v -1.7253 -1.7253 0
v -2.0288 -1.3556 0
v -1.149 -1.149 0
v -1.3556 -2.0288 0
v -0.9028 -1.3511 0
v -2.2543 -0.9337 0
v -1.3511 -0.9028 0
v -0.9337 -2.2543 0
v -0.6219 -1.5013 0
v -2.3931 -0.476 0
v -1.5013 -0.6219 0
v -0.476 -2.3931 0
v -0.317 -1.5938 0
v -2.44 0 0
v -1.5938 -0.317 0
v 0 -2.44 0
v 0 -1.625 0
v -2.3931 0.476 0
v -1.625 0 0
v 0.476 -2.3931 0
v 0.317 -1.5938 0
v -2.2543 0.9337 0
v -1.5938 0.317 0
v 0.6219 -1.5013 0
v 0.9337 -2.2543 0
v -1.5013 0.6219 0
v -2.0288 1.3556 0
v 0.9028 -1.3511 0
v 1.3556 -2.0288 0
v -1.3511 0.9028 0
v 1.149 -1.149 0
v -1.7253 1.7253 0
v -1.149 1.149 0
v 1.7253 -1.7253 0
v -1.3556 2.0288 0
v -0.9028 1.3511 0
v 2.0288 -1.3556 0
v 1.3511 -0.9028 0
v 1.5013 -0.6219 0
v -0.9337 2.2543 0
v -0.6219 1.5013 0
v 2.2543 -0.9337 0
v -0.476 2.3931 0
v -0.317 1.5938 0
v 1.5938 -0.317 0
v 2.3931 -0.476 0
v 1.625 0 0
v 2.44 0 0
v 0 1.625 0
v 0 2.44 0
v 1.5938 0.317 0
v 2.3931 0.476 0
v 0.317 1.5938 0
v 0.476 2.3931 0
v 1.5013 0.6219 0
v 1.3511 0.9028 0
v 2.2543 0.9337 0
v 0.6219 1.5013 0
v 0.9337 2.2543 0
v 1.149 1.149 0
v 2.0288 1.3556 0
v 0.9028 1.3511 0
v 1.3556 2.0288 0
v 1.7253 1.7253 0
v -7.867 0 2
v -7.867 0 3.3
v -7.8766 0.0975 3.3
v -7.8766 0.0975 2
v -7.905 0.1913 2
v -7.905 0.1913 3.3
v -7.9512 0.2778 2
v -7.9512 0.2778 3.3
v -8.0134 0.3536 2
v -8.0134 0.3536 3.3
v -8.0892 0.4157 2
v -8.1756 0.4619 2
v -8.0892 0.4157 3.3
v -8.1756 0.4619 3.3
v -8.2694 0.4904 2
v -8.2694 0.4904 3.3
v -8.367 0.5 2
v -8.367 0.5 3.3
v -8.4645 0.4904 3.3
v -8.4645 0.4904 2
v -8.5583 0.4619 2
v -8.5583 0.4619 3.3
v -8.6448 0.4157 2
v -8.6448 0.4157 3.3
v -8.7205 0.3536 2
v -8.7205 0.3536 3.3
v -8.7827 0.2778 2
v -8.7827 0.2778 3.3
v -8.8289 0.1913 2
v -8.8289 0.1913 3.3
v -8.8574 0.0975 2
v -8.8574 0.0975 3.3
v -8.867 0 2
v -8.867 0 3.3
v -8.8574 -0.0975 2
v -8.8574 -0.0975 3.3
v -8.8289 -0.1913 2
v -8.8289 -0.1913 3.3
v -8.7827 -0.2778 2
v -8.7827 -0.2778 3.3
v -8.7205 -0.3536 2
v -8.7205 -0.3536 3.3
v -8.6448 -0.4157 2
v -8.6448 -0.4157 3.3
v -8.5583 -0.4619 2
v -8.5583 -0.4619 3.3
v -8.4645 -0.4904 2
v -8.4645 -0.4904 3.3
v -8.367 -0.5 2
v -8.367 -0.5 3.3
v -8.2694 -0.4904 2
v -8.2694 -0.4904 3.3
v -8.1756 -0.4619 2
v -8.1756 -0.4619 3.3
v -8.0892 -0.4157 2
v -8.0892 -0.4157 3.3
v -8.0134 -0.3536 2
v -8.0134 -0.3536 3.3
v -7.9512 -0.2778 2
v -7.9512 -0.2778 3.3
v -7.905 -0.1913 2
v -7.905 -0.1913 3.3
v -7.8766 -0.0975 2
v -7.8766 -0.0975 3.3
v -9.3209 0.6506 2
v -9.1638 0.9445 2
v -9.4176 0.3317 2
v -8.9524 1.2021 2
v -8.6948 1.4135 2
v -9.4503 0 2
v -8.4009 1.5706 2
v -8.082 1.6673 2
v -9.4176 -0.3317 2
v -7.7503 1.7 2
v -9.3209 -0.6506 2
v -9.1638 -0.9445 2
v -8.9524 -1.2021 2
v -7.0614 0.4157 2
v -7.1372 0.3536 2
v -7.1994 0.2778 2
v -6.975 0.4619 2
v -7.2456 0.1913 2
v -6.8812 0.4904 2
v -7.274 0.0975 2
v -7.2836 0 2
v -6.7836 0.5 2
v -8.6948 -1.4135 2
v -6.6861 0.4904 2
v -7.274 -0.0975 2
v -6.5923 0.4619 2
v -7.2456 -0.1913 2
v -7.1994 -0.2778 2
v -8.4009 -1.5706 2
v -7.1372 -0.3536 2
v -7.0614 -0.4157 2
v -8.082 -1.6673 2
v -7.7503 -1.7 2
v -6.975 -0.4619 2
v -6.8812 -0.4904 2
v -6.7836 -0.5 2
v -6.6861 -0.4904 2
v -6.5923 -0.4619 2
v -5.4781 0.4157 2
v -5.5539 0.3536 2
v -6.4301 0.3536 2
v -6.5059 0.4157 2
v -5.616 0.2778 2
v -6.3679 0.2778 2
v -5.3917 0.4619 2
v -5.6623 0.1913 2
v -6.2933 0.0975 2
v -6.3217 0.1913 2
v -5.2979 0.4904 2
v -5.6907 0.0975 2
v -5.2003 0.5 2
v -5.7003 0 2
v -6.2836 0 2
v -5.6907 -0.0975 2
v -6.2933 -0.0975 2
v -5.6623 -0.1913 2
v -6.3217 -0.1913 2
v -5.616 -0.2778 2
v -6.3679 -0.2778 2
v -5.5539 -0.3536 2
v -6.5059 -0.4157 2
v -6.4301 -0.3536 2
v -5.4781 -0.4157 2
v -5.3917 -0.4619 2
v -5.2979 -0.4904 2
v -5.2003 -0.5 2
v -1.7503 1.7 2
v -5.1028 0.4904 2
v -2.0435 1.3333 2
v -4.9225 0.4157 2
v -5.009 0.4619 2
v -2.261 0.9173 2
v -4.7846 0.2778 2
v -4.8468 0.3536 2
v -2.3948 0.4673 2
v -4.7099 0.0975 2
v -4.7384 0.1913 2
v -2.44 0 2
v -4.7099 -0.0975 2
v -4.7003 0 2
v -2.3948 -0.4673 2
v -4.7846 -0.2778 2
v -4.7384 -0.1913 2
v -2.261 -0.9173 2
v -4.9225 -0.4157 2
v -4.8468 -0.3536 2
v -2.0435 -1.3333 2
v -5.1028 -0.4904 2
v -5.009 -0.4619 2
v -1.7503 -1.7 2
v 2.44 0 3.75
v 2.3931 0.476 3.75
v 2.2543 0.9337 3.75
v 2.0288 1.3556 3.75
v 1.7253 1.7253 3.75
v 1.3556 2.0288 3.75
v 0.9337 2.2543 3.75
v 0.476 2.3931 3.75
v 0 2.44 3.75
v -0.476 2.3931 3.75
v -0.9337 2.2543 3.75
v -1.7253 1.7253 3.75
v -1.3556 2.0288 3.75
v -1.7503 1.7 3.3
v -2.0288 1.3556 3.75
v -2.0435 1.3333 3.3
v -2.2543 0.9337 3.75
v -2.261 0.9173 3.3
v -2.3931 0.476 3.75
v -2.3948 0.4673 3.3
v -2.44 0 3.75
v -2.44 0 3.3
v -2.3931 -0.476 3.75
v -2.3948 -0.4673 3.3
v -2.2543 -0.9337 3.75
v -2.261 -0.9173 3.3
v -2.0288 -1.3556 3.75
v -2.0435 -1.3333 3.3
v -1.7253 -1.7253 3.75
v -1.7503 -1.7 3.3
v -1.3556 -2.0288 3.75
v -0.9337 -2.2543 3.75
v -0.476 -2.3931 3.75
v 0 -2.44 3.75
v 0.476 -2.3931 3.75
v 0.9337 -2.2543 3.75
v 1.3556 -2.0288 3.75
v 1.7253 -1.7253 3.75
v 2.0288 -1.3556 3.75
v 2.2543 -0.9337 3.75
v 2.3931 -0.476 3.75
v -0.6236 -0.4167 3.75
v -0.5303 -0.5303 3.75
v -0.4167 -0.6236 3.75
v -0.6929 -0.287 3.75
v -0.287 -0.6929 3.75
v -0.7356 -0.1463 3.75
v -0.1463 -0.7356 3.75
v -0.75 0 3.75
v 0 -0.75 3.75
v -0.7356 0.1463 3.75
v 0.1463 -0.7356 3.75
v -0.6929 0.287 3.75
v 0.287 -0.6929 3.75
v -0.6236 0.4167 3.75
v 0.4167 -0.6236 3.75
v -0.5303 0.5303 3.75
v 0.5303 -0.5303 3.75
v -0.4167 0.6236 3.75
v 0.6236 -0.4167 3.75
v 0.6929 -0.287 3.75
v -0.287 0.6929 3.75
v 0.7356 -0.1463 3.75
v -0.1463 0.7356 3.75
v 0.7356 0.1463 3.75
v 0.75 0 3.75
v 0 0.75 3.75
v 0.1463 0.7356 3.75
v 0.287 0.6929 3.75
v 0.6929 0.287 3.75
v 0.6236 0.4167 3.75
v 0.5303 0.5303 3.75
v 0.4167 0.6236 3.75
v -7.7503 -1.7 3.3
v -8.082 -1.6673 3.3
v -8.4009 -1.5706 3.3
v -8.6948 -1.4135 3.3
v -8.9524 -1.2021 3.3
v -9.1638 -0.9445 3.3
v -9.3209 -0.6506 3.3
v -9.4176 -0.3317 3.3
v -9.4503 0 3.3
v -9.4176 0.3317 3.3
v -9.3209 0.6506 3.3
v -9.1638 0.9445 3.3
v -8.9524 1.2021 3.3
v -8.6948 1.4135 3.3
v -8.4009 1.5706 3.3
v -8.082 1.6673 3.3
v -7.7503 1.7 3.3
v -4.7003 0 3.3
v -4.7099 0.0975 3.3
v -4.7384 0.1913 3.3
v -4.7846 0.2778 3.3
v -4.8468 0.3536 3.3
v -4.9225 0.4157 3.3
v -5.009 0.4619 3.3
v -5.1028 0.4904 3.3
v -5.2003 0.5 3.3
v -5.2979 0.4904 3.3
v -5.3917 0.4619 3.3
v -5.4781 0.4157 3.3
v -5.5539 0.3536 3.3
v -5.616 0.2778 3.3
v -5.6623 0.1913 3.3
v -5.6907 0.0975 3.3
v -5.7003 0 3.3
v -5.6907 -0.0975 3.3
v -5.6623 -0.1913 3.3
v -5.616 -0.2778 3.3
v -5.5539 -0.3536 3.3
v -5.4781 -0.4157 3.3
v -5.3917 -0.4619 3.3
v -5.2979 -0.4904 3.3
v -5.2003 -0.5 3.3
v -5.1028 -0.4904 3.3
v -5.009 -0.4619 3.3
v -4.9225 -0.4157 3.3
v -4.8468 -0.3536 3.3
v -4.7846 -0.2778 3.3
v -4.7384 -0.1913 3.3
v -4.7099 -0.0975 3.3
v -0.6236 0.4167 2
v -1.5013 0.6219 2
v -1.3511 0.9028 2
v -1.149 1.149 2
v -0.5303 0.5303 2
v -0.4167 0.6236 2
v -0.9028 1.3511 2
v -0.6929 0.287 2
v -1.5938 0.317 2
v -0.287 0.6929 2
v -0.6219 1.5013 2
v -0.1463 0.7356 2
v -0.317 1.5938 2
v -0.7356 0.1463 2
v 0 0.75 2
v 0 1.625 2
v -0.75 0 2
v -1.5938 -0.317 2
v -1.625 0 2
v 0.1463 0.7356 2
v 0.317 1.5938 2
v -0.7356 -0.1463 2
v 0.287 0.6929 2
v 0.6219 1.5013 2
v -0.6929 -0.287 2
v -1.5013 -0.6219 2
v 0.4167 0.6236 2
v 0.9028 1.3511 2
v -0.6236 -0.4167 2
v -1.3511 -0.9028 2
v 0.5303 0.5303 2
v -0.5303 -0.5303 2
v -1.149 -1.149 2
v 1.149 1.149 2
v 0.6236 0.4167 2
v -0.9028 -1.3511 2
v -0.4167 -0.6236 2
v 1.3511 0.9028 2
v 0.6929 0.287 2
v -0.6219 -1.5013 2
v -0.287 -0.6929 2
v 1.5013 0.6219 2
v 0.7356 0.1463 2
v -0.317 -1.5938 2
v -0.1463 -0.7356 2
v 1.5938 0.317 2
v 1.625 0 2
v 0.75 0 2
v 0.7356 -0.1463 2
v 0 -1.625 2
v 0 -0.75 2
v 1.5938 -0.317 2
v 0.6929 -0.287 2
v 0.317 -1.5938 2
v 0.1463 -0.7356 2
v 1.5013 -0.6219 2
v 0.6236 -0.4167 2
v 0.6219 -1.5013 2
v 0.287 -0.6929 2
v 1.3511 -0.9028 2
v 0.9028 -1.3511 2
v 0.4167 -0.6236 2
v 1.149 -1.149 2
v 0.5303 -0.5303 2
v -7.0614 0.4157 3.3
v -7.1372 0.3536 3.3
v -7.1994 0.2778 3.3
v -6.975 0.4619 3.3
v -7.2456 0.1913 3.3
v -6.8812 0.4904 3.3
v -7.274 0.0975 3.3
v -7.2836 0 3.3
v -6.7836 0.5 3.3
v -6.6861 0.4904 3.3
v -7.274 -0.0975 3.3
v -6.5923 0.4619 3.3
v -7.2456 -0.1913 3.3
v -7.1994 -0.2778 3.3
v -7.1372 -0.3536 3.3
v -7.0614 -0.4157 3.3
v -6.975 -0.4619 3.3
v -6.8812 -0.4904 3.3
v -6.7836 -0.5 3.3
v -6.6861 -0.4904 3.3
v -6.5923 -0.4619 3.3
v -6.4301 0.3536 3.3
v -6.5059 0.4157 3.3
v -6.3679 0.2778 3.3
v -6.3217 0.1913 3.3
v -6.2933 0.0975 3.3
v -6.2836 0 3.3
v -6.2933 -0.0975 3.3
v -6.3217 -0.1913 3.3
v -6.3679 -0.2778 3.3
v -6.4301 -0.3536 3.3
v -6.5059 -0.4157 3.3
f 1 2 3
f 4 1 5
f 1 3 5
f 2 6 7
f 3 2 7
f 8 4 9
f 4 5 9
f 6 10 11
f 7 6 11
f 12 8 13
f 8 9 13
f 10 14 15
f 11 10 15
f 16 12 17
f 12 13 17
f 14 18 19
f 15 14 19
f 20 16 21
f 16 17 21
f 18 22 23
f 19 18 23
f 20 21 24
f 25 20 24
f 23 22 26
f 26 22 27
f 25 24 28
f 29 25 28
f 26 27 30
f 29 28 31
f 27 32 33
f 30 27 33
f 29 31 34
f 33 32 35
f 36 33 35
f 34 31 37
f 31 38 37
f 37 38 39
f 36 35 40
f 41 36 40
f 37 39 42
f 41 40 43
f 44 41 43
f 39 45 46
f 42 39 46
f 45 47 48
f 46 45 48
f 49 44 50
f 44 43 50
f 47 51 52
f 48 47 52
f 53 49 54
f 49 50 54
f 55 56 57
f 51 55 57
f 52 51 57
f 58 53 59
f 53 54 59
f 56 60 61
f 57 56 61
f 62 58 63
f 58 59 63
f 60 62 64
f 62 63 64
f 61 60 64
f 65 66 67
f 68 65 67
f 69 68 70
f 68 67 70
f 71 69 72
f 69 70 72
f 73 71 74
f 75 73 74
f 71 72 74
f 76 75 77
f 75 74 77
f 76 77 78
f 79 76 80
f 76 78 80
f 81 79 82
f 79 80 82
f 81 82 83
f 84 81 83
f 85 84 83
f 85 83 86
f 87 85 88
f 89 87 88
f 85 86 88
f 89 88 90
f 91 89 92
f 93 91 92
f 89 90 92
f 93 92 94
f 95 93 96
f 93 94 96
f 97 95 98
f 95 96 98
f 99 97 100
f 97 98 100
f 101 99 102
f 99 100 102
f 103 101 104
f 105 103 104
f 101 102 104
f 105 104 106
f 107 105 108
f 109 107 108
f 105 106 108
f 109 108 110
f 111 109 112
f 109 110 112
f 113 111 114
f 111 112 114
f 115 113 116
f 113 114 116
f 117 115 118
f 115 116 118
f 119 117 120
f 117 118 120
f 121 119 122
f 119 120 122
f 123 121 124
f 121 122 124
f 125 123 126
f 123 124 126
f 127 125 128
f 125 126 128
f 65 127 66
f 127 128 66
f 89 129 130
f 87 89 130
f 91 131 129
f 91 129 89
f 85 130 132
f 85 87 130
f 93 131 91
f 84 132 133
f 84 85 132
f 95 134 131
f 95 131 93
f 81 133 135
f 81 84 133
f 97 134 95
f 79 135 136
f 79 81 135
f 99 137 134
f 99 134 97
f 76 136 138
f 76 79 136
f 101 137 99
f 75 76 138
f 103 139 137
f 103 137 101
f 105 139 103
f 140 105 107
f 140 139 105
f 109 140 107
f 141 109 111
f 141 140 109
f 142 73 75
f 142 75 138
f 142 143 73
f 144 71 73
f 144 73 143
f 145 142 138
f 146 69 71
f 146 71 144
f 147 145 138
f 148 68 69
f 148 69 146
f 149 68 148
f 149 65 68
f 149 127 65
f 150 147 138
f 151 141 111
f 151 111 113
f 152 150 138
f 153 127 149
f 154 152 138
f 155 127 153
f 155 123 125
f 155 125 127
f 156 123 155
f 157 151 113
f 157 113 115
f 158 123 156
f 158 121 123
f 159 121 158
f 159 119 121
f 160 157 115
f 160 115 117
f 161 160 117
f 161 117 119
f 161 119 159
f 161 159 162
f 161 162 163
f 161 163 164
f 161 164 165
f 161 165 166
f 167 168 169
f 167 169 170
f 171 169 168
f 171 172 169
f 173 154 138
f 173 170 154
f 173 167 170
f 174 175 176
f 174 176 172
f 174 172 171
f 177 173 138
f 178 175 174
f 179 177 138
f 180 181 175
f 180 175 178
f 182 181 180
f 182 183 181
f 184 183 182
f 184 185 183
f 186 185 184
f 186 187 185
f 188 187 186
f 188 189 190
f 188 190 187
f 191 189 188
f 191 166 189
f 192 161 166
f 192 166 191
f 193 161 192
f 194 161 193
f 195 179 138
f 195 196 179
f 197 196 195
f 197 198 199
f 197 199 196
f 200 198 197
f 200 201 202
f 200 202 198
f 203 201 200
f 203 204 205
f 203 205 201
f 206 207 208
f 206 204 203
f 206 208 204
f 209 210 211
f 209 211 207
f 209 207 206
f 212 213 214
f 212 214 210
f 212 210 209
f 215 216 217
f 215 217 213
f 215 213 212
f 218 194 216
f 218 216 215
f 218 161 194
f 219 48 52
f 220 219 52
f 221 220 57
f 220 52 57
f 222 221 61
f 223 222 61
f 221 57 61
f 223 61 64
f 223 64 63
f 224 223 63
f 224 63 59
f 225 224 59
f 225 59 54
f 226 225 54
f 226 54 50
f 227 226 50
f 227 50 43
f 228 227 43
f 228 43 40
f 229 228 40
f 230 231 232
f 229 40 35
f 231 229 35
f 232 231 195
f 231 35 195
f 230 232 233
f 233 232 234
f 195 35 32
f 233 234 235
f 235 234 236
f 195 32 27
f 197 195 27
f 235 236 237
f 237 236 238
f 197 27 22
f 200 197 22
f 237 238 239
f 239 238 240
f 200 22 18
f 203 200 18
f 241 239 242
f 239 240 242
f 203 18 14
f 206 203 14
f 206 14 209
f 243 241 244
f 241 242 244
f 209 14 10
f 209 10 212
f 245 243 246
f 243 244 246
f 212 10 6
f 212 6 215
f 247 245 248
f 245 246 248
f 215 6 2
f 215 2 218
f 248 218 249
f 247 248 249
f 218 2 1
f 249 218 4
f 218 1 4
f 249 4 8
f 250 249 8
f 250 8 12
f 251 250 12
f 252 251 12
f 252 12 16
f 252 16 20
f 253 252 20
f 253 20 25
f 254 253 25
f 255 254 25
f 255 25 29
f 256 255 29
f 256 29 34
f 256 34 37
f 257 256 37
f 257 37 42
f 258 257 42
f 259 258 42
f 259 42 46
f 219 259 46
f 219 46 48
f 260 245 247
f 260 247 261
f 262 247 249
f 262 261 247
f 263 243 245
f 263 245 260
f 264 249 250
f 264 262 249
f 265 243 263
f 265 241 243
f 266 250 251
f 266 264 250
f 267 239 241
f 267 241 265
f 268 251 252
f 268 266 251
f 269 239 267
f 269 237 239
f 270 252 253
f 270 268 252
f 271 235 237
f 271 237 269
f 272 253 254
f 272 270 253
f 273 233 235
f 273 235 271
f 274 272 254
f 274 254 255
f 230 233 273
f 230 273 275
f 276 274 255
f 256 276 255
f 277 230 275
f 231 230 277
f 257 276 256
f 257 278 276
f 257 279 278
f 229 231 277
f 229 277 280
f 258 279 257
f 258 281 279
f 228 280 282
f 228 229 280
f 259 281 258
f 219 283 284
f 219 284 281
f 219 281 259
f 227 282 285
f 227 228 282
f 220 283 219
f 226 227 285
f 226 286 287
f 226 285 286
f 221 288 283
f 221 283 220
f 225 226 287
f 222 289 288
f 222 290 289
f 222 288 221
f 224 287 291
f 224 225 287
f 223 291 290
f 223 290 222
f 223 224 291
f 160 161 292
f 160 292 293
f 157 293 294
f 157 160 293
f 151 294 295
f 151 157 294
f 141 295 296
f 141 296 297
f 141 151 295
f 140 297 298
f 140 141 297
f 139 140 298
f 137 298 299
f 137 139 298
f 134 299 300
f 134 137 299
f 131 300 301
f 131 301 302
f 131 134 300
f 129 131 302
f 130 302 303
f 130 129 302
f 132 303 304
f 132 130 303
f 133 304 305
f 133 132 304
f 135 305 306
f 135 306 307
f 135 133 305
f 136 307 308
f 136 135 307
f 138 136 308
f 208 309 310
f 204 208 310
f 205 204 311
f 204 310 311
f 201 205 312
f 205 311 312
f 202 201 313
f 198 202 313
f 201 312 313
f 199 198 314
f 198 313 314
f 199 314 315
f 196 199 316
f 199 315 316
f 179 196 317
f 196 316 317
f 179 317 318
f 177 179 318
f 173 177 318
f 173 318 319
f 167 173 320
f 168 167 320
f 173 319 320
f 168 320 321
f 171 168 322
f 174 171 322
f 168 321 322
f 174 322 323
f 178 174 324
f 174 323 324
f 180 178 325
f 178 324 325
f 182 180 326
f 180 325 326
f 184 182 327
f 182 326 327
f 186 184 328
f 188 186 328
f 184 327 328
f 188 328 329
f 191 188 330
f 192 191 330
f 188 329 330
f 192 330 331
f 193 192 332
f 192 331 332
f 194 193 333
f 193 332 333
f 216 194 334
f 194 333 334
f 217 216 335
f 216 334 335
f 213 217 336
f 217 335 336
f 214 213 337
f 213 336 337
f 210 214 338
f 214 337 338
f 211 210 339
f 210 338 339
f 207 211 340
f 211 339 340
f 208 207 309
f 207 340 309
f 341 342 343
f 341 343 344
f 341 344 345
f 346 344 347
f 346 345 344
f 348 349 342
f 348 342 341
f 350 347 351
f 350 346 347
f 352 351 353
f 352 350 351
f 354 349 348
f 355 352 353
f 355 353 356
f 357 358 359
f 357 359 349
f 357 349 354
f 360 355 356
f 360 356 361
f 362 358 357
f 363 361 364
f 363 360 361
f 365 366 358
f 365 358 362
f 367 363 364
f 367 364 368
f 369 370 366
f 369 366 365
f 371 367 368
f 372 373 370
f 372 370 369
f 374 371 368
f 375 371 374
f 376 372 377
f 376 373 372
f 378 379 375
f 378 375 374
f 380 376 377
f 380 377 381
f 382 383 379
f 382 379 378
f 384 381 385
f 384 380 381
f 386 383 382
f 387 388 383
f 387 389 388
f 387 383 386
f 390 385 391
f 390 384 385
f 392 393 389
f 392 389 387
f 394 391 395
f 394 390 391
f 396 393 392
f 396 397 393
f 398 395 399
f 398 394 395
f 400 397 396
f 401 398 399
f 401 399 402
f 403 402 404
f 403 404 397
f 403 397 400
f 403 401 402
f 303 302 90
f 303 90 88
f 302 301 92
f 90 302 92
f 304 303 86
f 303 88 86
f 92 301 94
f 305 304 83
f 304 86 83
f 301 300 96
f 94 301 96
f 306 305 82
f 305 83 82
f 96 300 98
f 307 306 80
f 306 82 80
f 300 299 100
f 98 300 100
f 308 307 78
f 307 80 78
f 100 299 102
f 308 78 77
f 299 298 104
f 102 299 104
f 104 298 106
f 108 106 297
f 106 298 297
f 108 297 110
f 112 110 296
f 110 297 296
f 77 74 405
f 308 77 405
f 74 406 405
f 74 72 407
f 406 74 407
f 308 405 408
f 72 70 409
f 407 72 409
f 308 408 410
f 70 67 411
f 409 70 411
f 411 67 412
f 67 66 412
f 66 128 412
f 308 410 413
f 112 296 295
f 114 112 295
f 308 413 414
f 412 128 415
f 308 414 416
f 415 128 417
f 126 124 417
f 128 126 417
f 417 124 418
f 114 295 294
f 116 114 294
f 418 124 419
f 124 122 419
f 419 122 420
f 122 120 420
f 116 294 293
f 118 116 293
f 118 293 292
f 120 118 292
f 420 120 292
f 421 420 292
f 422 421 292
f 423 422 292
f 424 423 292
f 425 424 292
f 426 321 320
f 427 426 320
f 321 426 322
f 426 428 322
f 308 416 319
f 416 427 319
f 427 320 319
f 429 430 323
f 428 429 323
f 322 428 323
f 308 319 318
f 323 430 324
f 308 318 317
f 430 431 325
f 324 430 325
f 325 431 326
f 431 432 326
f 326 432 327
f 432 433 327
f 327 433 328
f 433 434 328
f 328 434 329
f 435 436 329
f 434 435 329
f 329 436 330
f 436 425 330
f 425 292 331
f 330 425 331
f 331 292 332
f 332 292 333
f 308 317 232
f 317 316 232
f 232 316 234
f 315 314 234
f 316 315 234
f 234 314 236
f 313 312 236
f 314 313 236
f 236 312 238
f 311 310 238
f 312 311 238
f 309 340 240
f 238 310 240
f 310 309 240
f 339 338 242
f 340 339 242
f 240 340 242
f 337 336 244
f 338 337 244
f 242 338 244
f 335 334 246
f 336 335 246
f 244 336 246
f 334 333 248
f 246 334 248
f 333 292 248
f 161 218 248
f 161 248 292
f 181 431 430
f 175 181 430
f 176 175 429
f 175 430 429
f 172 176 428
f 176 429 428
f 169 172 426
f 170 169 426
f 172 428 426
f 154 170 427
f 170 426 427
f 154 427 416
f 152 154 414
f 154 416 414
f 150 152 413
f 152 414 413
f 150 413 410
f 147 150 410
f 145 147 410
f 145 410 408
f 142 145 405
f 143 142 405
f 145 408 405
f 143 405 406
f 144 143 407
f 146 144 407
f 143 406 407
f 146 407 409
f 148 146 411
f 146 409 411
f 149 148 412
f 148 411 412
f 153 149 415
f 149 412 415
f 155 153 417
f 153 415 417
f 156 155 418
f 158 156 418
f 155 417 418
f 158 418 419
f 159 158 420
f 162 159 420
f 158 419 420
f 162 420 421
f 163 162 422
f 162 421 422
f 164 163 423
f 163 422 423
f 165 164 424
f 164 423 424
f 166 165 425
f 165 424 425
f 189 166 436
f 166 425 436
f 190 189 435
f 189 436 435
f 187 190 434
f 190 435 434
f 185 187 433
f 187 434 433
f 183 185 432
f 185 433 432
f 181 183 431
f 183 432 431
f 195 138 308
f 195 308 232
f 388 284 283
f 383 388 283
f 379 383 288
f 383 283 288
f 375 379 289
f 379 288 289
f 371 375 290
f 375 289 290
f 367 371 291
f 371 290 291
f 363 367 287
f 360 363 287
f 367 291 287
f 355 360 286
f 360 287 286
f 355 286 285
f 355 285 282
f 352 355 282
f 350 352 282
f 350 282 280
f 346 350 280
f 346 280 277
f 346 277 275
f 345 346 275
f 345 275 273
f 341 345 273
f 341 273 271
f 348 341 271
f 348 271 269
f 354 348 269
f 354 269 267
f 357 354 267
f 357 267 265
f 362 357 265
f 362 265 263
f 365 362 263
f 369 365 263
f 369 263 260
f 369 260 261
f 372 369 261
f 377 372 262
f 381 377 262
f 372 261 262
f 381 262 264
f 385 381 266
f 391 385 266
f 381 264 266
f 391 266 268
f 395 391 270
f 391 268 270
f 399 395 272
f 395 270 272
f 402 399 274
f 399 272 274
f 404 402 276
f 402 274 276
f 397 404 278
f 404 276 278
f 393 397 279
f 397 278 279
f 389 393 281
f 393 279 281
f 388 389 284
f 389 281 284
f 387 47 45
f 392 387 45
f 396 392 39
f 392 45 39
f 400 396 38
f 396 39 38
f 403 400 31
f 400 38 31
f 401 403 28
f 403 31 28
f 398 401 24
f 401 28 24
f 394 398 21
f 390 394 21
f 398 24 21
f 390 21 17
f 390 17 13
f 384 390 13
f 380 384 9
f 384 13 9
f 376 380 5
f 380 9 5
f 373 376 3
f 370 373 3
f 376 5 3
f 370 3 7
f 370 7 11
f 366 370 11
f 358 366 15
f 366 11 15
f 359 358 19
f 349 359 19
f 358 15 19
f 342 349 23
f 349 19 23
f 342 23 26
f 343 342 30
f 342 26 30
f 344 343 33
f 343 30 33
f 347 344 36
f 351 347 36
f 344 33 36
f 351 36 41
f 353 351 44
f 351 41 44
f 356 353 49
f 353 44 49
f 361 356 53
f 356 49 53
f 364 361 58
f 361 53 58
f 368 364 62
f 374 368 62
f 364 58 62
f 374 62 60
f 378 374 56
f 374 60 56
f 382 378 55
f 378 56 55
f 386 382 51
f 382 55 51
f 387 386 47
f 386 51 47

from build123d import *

# Parameters (mm, degrees)
F0_R      = 2.44
F1_DEPTH  = 3.75
F2_R      = 1.625
F3_DEPTH  = 2
F6_DEPTH  = 1.3
F7_R      = 0.75
F8_DEPTH  = 25
F9_R      = 0.5
F10_DEPTH = 1.3


with BuildPart() as f1:
    # F0 (on Top) → F1 (new body)
    with BuildSketch(Plane.XY):
        Circle(F0_R)
    extrude(amount=F1_DEPTH)

    # F2 (on face) → F3 (cut)
    with BuildSketch(Plane(origin=(0, 0, 0), x_dir=(1, 0, 0), z_dir=(0, 0, -1))):
        Circle(F2_R)
    extrude(amount=-F3_DEPTH, mode=Mode.SUBTRACT)

    # F5 (on offset) → F6 (join)
    with BuildSketch(Plane(origin=(0, 0, 2), x_dir=(1, 0, 0), z_dir=(0, 0, -1))):
        with BuildLine():
            Line((-7.750314, -1.7), (-1.750314, -1.7))
            Line((-1.750314, -1.7), (-1.750314, 1.7))
            Line((-1.750314, 1.7), (-7.750314, 1.7))
            ThreePointArc((-7.750314, 1.7), (-9.450314, 0), (-7.750314, -1.7))
        make_face()
    extrude(amount=-F6_DEPTH)

    # F7 (on face) → F8 (cut)
    with BuildSketch(Plane.XY.offset(3.75)):
        Circle(F7_R)
    extrude(amount=-F8_DEPTH, mode=Mode.SUBTRACT)

    # F9 (on face) → F10 (cut, through all)
    with BuildSketch(Plane.XY.offset(3.3)):
        with Locations((-8.366981, 0)):
            Circle(F9_R)
        with Locations((-6.783648, 0)):
            Circle(F9_R)
        with Locations((-5.200314, 0)):
            Circle(F9_R)
    extrude(amount=-F10_DEPTH, mode=Mode.SUBTRACT)


solid = f1.part
